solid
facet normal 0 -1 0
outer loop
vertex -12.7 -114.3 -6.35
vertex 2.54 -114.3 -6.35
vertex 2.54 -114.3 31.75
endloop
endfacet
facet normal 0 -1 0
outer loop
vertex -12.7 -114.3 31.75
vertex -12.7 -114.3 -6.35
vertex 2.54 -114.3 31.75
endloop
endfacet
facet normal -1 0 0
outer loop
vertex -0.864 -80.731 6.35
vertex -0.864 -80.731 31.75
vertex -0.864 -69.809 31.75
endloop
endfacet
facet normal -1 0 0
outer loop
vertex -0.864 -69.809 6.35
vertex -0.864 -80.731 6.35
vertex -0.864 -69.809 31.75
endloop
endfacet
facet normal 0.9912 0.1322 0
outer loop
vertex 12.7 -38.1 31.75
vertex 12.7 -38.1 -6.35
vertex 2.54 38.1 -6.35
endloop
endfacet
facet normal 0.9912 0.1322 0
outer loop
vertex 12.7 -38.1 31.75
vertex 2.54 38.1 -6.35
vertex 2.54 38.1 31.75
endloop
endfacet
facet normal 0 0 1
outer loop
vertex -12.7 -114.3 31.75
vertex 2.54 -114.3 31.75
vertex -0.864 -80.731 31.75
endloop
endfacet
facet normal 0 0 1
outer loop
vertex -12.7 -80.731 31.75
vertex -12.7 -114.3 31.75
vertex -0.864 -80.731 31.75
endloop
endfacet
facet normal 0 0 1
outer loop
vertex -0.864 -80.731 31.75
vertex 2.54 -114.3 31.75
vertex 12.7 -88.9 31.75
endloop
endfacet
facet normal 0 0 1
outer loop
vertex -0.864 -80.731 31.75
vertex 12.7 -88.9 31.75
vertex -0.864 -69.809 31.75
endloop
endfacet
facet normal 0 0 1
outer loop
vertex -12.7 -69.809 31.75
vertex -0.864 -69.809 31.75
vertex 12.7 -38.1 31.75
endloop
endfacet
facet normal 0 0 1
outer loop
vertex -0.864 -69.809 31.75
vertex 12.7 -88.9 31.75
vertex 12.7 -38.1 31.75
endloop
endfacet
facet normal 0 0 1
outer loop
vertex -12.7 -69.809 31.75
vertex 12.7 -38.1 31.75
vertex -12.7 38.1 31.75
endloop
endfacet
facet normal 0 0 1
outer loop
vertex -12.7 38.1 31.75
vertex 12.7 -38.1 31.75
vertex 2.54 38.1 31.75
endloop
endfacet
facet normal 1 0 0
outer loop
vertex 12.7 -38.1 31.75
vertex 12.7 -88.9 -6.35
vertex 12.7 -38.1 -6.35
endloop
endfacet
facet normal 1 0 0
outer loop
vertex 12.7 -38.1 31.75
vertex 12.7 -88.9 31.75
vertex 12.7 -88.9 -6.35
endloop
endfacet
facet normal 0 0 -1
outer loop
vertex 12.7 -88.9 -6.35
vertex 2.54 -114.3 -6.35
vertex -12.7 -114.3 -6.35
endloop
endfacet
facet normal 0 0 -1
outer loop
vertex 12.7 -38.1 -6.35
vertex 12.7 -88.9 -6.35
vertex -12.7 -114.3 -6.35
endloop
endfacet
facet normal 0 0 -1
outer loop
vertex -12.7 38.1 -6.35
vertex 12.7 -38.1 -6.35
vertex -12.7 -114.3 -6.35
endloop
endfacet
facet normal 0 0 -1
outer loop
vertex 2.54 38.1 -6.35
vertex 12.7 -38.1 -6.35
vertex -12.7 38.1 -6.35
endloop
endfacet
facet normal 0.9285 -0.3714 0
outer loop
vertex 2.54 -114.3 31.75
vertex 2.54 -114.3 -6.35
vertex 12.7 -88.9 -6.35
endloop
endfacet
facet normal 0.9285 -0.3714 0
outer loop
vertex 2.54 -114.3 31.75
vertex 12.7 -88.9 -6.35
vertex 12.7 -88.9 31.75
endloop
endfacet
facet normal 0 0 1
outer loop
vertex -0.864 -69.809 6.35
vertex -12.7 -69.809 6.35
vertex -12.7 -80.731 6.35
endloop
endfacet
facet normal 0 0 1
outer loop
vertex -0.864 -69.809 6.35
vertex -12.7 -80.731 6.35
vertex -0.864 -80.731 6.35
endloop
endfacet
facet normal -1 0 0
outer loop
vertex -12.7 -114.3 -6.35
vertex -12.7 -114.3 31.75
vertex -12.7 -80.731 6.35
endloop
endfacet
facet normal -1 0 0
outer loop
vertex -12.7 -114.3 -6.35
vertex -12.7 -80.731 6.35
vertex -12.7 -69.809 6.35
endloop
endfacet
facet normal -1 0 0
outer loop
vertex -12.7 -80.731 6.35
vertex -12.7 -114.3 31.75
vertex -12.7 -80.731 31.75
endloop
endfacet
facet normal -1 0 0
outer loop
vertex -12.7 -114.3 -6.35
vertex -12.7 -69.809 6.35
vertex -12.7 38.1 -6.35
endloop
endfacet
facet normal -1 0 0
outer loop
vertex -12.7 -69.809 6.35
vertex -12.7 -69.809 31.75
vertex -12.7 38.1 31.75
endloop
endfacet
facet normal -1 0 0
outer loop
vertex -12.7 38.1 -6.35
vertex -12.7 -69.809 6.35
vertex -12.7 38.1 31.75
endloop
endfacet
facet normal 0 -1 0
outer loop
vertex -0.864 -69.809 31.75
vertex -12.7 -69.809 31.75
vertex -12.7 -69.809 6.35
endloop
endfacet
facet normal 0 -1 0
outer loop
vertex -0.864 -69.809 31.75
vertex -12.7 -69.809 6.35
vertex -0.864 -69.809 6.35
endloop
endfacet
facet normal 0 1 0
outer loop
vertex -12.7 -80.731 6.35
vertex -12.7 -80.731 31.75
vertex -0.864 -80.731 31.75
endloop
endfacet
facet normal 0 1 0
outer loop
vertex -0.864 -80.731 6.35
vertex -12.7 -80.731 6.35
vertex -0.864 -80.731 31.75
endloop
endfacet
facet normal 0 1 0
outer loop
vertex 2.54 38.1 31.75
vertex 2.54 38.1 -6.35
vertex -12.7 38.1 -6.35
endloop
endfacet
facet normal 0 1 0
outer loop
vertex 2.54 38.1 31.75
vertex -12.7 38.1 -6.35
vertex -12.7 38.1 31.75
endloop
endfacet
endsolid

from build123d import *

# Parameters (mm, degrees)
F0_W     = 152.4
F0_H     = 38.1
F1_DEPTH = 12.7
F2_SIZE2 = 10.16
F2_SIZE  = 25.4
F3_SIZE2 = 10.16
F3_SIZE  = 76.2
F4_W     = 11.8357492981
F4_H     = 10.9219625592
F5_DEPTH = 25.4


with BuildPart() as f1:
    # F0 (on Right) → F1 (new body, symmetric)
    with BuildSketch(Plane.YZ):
        with Locations((-38.1, 12.7)):
            Rectangle(F0_W, F0_H)
    extrude(amount=F1_DEPTH, both=True)

    # F2
    f2_edges = [f1.edges().sort_by_distance(p)[0] for p in [
        (12.7, -114.3, 12.7),
    ]]
    f2_side = f1.faces().sort_by_distance((12.7, -38.1, 12.7))[0]
    chamfer(f2_edges, length=F2_SIZE, length2=F2_SIZE2, reference=f2_side)

    # F3
    f3_edges = [f1.edges().sort_by_distance(p)[0] for p in [
        (12.7, 38.1, 12.7),
    ]]
    f3_side = f1.faces().sort_by_distance((12.7, -25.4, 12.7))[0]
    chamfer(f3_edges, length=F3_SIZE, length2=F3_SIZE2, reference=f3_side)

    # F4 (on face) → F5 (cut)
    with BuildSketch(Plane.XY.offset(31.75)):
        with Locations((-6.7821253509, -75.2695389092)):
            Rectangle(F4_W, F4_H)
    extrude(amount=-F5_DEPTH, mode=Mode.SUBTRACT)


solid = f1.part
